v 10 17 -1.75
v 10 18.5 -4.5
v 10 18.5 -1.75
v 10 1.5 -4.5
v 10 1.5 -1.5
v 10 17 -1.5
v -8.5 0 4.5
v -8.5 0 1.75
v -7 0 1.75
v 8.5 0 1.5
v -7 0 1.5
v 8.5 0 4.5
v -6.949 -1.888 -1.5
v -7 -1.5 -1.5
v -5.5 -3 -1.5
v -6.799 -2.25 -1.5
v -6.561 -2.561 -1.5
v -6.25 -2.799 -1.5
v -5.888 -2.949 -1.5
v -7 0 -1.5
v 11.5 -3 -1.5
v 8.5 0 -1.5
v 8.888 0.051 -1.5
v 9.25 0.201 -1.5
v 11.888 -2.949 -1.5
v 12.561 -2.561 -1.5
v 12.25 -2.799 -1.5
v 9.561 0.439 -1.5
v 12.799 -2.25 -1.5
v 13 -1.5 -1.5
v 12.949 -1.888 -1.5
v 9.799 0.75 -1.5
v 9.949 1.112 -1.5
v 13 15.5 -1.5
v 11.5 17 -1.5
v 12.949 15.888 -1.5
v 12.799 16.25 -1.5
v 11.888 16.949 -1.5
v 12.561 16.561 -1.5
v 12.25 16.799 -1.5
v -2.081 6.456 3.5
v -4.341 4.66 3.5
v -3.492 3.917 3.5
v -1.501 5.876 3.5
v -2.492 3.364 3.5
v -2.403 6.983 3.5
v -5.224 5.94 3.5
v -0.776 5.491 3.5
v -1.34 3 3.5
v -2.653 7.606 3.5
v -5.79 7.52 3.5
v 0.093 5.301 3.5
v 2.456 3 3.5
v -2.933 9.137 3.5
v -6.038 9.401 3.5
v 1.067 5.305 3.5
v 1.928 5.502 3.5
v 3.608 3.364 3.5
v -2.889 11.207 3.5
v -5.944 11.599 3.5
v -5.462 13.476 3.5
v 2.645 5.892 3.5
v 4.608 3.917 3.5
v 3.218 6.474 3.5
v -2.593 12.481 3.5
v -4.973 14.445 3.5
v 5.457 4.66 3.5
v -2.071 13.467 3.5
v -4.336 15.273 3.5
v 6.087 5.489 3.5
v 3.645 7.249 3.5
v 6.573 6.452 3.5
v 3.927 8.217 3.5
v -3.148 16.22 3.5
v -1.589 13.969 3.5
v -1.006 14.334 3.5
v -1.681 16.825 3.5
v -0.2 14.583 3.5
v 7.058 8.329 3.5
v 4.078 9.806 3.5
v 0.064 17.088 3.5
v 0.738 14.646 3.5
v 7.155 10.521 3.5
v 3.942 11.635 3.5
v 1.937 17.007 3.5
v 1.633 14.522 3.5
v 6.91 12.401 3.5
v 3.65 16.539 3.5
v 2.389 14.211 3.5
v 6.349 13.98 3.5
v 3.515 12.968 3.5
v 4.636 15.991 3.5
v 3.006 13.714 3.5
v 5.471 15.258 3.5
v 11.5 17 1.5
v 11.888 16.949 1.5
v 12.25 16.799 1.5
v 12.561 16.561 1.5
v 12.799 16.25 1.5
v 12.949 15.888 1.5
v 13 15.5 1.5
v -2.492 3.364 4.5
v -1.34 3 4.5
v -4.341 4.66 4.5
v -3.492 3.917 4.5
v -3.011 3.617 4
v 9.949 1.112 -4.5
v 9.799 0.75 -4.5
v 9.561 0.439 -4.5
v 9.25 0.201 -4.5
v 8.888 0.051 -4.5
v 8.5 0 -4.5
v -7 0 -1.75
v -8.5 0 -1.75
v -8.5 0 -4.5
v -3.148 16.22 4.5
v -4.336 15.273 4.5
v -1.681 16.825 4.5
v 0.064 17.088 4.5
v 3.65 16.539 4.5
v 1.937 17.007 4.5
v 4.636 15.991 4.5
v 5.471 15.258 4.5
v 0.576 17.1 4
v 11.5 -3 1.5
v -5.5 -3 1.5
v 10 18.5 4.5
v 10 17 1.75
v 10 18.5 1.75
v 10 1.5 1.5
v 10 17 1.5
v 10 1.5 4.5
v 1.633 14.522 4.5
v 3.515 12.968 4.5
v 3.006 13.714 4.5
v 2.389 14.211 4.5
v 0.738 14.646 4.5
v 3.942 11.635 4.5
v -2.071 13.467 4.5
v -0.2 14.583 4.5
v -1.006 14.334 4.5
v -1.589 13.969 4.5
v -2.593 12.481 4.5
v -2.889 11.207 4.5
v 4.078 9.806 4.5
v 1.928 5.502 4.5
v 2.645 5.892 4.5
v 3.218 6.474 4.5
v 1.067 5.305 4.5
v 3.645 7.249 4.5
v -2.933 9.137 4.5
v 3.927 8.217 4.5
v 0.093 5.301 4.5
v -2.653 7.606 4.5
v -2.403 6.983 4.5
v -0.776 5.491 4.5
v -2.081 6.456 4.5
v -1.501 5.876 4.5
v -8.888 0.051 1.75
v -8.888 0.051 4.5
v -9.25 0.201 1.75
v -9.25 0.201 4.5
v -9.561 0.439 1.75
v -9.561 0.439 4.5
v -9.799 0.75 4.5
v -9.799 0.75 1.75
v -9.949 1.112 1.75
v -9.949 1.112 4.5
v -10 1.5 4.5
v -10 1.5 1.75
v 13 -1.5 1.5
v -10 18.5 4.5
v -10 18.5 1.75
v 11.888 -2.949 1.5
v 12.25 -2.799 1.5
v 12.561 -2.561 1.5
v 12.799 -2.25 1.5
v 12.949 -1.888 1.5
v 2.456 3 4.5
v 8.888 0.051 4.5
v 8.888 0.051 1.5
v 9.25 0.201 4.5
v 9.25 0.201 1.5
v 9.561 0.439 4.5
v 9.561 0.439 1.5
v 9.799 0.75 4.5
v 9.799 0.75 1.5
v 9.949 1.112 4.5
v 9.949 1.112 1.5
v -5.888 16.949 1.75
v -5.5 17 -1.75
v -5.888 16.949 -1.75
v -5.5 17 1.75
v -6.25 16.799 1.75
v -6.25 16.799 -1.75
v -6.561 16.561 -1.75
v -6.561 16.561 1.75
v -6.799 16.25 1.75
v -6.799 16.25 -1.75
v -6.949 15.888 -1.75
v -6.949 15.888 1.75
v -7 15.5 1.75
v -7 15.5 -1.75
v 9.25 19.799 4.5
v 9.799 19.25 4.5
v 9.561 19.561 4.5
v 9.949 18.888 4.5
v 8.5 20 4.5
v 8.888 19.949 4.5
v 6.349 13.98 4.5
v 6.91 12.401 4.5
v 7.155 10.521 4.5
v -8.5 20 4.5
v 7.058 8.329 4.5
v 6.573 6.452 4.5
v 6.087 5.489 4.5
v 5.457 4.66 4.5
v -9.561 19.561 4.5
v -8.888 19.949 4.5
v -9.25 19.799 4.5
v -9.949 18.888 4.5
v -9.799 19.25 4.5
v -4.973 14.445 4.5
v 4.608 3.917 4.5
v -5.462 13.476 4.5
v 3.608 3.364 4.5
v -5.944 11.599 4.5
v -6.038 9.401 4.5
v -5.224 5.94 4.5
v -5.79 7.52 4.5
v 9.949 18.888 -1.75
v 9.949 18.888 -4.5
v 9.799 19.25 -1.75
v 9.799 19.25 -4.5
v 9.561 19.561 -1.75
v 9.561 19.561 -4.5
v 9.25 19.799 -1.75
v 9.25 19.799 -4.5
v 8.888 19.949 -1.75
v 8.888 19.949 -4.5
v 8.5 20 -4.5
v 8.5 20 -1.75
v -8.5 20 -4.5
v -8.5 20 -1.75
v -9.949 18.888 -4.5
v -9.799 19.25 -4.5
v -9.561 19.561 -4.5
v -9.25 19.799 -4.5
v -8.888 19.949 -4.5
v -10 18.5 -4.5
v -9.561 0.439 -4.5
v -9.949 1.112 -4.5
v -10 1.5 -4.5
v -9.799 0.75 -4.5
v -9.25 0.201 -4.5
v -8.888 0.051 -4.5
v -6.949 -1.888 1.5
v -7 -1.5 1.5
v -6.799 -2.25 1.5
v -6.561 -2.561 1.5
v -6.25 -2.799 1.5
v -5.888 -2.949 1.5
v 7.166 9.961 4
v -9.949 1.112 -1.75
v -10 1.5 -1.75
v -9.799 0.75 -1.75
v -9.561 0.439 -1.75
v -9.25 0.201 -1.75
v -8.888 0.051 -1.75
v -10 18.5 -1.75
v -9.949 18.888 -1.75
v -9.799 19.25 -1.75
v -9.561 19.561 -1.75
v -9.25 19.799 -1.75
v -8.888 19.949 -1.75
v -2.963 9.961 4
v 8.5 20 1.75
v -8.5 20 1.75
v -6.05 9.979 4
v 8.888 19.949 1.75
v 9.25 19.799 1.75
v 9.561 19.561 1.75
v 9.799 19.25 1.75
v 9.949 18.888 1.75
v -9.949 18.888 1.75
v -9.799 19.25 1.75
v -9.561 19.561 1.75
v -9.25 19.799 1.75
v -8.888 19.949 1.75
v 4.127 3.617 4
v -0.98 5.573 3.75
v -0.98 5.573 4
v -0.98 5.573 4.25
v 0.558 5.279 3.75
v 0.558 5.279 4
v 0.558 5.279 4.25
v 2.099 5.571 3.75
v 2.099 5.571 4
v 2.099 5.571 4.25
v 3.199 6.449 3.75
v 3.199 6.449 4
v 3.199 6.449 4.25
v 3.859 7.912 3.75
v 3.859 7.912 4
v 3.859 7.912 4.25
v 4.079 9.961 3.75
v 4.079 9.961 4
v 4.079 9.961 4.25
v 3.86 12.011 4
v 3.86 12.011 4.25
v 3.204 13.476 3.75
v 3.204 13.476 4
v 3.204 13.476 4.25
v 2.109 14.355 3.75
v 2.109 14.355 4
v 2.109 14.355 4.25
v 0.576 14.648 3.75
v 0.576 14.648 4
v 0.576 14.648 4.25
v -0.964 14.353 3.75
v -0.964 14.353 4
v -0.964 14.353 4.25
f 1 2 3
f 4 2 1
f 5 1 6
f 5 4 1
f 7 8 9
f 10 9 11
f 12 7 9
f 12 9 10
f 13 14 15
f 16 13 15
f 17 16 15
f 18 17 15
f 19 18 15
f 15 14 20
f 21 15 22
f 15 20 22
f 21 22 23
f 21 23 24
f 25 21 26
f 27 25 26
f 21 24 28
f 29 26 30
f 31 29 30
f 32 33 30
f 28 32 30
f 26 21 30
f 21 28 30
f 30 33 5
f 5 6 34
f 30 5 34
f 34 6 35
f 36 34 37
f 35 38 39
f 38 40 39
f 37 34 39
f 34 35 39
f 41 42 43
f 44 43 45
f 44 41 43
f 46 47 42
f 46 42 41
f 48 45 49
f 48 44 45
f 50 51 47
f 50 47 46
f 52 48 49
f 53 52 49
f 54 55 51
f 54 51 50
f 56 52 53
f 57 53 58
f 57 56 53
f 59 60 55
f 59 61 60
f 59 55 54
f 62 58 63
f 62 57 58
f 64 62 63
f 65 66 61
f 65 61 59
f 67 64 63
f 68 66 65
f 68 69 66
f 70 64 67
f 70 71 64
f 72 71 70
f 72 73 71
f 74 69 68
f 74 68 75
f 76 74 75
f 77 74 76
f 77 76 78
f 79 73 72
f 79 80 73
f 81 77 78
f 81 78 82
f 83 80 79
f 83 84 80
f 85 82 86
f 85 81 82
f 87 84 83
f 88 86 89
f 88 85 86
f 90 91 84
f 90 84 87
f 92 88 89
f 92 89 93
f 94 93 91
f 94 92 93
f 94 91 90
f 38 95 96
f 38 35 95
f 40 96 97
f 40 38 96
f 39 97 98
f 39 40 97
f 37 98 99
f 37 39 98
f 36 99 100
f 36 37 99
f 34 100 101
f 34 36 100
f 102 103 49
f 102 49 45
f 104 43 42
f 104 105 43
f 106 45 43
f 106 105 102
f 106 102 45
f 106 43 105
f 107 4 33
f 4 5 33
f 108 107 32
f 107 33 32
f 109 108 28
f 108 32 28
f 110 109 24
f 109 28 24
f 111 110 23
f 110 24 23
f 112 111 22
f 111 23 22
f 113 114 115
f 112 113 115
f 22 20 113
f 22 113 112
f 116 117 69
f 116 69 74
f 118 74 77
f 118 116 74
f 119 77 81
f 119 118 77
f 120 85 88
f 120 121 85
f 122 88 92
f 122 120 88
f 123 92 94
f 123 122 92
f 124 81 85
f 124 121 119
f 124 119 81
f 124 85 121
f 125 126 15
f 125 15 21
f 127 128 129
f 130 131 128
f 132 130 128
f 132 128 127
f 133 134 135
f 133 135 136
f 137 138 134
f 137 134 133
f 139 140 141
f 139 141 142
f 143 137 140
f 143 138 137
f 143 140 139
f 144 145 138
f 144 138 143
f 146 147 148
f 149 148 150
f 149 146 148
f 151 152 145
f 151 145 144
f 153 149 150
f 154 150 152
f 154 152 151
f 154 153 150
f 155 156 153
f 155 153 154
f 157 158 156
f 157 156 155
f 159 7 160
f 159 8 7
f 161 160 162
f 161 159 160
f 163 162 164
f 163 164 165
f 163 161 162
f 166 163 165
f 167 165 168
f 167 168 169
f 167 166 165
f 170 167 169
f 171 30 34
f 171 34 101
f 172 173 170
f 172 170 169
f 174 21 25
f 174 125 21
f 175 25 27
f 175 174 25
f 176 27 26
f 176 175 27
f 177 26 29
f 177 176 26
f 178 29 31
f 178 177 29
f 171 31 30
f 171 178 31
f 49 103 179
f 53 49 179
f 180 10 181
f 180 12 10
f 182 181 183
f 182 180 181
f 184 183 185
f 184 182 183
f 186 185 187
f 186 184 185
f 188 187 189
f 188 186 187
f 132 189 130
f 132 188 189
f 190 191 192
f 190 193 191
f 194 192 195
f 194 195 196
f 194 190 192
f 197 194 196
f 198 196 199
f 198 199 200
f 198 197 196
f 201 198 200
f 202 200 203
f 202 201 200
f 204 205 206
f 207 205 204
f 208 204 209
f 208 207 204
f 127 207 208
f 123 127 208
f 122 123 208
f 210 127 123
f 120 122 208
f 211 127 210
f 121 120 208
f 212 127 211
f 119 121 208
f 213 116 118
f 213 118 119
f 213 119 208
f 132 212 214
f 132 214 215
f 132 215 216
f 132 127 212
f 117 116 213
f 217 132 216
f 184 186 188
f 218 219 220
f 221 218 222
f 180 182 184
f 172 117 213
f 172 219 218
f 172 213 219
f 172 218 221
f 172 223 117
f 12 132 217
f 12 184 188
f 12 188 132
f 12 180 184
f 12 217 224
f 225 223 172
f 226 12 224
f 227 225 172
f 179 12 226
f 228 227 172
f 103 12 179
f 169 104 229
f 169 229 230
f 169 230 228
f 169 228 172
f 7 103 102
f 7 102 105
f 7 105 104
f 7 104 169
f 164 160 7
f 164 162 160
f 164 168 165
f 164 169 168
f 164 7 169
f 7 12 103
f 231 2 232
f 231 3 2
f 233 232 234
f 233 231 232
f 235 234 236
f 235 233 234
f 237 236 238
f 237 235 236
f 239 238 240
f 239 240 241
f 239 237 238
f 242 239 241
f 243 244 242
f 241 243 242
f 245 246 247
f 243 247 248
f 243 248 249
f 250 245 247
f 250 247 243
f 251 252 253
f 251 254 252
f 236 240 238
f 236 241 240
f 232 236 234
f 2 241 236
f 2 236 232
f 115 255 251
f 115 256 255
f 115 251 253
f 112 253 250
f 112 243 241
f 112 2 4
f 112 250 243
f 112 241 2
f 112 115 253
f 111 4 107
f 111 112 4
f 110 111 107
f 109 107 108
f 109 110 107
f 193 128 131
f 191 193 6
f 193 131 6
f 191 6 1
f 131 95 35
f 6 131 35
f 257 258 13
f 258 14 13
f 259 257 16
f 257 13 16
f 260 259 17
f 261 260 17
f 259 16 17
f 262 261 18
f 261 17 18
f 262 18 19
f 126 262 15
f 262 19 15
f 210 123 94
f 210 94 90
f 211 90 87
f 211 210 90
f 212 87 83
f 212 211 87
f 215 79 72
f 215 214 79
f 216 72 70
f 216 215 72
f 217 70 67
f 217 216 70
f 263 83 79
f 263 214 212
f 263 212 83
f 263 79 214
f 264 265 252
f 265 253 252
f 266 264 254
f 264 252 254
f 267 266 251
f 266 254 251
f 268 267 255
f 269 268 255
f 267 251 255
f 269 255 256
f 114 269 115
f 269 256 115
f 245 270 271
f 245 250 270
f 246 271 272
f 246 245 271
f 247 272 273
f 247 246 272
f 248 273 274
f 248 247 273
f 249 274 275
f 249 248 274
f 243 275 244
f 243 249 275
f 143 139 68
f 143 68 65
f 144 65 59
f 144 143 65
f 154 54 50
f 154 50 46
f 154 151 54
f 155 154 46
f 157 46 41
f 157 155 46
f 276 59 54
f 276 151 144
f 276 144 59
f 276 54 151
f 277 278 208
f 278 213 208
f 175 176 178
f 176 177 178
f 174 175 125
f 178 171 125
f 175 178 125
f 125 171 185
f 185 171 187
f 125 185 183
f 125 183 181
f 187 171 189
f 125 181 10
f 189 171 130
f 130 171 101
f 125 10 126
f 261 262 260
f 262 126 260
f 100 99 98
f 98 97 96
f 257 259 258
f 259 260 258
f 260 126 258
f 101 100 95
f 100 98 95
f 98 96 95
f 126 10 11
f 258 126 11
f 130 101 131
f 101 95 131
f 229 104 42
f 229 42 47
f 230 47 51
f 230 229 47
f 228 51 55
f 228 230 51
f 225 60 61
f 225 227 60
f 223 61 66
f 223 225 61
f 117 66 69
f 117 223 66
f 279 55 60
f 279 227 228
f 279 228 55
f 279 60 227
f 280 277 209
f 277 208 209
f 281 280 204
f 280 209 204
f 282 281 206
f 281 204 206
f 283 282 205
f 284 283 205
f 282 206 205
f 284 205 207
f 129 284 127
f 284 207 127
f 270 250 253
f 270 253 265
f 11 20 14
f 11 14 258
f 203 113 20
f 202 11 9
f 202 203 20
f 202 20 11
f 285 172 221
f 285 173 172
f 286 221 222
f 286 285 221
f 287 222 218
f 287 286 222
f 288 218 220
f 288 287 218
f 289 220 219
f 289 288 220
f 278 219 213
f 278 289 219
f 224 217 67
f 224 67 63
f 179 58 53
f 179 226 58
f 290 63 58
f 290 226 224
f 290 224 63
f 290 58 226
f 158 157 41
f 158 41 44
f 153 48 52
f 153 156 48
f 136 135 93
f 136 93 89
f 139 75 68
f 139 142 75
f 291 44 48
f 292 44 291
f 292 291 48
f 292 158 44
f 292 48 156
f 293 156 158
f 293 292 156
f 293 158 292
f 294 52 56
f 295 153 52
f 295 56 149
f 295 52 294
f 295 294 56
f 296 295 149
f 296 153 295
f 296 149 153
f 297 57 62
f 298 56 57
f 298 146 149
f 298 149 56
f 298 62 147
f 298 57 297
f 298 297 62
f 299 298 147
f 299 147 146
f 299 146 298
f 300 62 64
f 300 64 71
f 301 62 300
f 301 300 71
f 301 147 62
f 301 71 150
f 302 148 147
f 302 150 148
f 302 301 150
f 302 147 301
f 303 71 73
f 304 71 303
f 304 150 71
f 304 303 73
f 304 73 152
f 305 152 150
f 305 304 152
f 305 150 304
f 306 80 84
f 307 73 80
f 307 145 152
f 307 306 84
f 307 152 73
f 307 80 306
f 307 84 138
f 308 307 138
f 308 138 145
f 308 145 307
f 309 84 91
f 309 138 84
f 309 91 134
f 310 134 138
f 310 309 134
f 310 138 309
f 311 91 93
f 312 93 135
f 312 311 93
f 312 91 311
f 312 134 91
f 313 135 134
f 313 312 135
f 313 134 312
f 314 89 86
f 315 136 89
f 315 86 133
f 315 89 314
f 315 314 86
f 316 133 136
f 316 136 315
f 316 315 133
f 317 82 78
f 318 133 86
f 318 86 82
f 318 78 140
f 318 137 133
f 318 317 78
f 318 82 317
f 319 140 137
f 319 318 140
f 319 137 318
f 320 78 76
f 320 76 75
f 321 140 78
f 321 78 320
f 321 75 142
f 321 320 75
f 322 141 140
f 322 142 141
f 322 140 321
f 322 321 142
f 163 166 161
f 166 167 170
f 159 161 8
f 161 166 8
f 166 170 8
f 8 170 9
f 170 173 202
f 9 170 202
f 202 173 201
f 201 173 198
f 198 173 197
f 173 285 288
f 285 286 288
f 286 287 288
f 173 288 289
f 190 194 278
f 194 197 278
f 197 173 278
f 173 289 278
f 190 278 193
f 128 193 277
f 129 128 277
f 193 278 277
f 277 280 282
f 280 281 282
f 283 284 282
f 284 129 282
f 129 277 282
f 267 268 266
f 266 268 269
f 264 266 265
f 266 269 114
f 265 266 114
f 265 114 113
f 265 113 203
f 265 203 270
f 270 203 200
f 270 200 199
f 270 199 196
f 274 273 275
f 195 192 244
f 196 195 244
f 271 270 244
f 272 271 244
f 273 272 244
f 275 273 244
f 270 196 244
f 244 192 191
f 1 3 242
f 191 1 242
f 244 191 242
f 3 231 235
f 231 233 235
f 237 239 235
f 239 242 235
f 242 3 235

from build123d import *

# Parameters (mm, degrees)
F0_W     = 14
F0_H     = 3
F0_W_2   = 3
F1_DEPTH = 20
F2_DEPTH = 3
F3_W     = 3
F3_H     = 3
F4_DEPTH = 100
F5_W     = 3
F5_H     = 3.5
F6_DEPTH = 100
F7_R     = 1.5
F9_DEPTH = 1


with BuildPart() as f1:
    # F0 (on Front) → F1 (new body)
    with BuildSketch(Plane.XZ):
        Polygon((10, 1.5), (10, 4.5), (-10, 4.5), (-10, 1.5), (-7, 1.5), (7, 1.5), align=None)
        Rectangle(F0_W, F0_H)
        with Locations((11.5, 0)):
            Rectangle(F0_W_2, F0_H)
        with Locations((8.5, 0)):
            Rectangle(F0_W_2, F0_H)
        with Locations((-8.5, 0)):
            Rectangle(F0_W_2, F0_H)
        Polygon((10, -4.5), (10, -1.5), (7, -1.5), (-7, -1.5), (-10, -1.5), (-10, -4.5), align=None)
    extrude(amount=-F1_DEPTH)

    # F0 (on Front) → F2 (join)
    with BuildSketch(Plane.XZ):
        with Locations((-8.5, 0)):
            Rectangle(F0_W_2, F0_H)
        Rectangle(F0_W, F0_H)
        with Locations((8.5, 0)):
            Rectangle(F0_W_2, F0_H)
        with Locations((11.5, 0)):
            Rectangle(F0_W_2, F0_H)
    extrude(amount=F2_DEPTH)

    # F3 (on face) → F4 (cut)
    with BuildSketch(Plane.YZ.offset(13)):
        Polygon((23, -1.75), (23, 1.75), (17, 1.75), (17, 1.5), (20, 1.5), (20, -1.5), (17, -1.5), (17, -1.75), align=None)
        with Locations((18.5, 0)):
            Rectangle(F3_W, F3_H)
    extrude(amount=-F4_DEPTH, mode=Mode.SUBTRACT)

    # F5 (on face) → F6 (cut)
    with BuildSketch(Plane(origin=(0, 17, 0), x_dir=(-1, 0, 0), z_dir=(0, 1, 0))):
        with Locations((11.5, 0)):
            Rectangle(F5_W, F5_H)
        with Locations((8.5, 0)):
            Rectangle(F5_W, F5_H)
    extrude(amount=-F6_DEPTH, mode=Mode.SUBTRACT)

    # F7
    f7_edges = [f1.edges().sort_by_distance(p)[0] for p in [
        (-7, -3, 0),
        (13, -3, 0),
        (10, 0, 3),
        (10, 0, -3),
        (-10, 0, -3.125),
        (-10, 0, 3.125),
        (-7, 17, 0),
        (-10, 20, 3.125),
        (-10, 20, -3.125),
        (13, 17, 0),
        (10, 20, 3.125),
        (10, 20, -3.125),
    ]]
    fillet(f7_edges, radius=F7_R)

    # F8 (on face) → F9 (cut)
    with BuildSketch(Plane.XY.offset(4.5)):
        with BuildLine():
            Line((-1.3400688011, 3), (2.4562410374, 3))
            add(Edge.make_bspline(
                [(5.4571746599, 4.6603732639), (4.2976318515, 3.403944212), (2.4562410374, 3)],
                knots=[0, 0, 0, 0.6784981919, 0.6784981919, 0.6784981919], degree=2))
            add(Edge.make_bspline(
                [(7.1661590349, 9.9605034722), (7.1661590349, 6.5121527778), (5.4571746599, 4.6603732639)],
                knots=[0, 0, 0, 1, 1, 1], degree=2))
            add(Edge.make_bspline(
                [(5.4708465349, 15.2575954861), (7.1661590349, 13.4149305556), (7.1661590349, 9.9605034722)],
                knots=[0, 0, 0, 1, 1, 1], degree=2))
            add(Edge.make_bspline(
                [(0.5763152849, 17.1002604167), (3.7755340349, 17.1002604167), (5.4708465349, 15.2575954861)],
                knots=[0, 0, 0, 1, 1, 1], degree=2))
            add(Edge.make_bspline(
                [(-4.3364451318, 15.2727864583), (-2.6229034651, 17.1002604167), (0.5763152849, 17.1002604167)],
                knots=[0, 0, 0, 1, 1, 1], degree=2))
            add(Edge.make_bspline(
                [(-6.0499867985, 9.9787326389), (-6.0499867985, 13.4453125), (-4.3364451318, 15.2727864583)],
                knots=[0, 0, 0, 1, 1, 1], degree=2))
            add(Edge.make_bspline(
                [(-4.3410024235, 4.6603732639), (-6.0499867985, 6.5121527778), (-6.0499867985, 9.9787326389)],
                knots=[0, 0, 0, 1, 1, 1], degree=2))
            add(Edge.make_bspline(
                [(-1.3400688011, 3), (-3.1814596151, 3.403944212), (-4.3410024235, 4.6603732639)],
                knots=[0.3215018081, 0.3215018081, 0.3215018081, 1, 1, 1], degree=2))
        make_face()
        with BuildLine():
            add(Edge.make_bspline(
                [(-2.9631812429, 9.9605034722), (-2.9631812429, 7.6332465278), (-2.0805857568, 6.4559461806)],
                knots=[0, 0, 0, 1, 1, 1], degree=2))
            add(Edge.make_bspline(
                [(-2.0714711735, 13.4665798611), (-2.9631812429, 12.2847222222), (-2.9631812429, 9.9605034722)],
                knots=[0, 0, 0, 1, 1, 1], degree=2))
            add(Edge.make_bspline(
                [(0.5763152849, 14.6484375), (-1.179761104, 14.6484375), (-2.0714711735, 13.4665798611)],
                knots=[0, 0, 0, 1, 1, 1], degree=2))
            add(Edge.make_bspline(
                [(4.0793534793, 9.9605034722), (4.0793534793, 14.6484375), (0.5763152849, 14.6484375)],
                knots=[0, 0, 0, 1, 1, 1], degree=2))
            add(Edge.make_bspline(
                [(0.5580861182, 5.2786458333), (4.0793534793, 5.2786458333), (4.0793534793, 9.9605034722)],
                knots=[0, 0, 0, 1, 1, 1], degree=2))
            add(Edge.make_bspline(
                [(-2.0805857568, 6.4559461806), (-1.1979902707, 5.2786458333), (0.5580861182, 5.2786458333)],
                knots=[0, 0, 0, 1, 1, 1], degree=2))
        make_face(mode=Mode.SUBTRACT)
    extrude(amount=-F9_DEPTH, mode=Mode.SUBTRACT)


solid = f1.part
